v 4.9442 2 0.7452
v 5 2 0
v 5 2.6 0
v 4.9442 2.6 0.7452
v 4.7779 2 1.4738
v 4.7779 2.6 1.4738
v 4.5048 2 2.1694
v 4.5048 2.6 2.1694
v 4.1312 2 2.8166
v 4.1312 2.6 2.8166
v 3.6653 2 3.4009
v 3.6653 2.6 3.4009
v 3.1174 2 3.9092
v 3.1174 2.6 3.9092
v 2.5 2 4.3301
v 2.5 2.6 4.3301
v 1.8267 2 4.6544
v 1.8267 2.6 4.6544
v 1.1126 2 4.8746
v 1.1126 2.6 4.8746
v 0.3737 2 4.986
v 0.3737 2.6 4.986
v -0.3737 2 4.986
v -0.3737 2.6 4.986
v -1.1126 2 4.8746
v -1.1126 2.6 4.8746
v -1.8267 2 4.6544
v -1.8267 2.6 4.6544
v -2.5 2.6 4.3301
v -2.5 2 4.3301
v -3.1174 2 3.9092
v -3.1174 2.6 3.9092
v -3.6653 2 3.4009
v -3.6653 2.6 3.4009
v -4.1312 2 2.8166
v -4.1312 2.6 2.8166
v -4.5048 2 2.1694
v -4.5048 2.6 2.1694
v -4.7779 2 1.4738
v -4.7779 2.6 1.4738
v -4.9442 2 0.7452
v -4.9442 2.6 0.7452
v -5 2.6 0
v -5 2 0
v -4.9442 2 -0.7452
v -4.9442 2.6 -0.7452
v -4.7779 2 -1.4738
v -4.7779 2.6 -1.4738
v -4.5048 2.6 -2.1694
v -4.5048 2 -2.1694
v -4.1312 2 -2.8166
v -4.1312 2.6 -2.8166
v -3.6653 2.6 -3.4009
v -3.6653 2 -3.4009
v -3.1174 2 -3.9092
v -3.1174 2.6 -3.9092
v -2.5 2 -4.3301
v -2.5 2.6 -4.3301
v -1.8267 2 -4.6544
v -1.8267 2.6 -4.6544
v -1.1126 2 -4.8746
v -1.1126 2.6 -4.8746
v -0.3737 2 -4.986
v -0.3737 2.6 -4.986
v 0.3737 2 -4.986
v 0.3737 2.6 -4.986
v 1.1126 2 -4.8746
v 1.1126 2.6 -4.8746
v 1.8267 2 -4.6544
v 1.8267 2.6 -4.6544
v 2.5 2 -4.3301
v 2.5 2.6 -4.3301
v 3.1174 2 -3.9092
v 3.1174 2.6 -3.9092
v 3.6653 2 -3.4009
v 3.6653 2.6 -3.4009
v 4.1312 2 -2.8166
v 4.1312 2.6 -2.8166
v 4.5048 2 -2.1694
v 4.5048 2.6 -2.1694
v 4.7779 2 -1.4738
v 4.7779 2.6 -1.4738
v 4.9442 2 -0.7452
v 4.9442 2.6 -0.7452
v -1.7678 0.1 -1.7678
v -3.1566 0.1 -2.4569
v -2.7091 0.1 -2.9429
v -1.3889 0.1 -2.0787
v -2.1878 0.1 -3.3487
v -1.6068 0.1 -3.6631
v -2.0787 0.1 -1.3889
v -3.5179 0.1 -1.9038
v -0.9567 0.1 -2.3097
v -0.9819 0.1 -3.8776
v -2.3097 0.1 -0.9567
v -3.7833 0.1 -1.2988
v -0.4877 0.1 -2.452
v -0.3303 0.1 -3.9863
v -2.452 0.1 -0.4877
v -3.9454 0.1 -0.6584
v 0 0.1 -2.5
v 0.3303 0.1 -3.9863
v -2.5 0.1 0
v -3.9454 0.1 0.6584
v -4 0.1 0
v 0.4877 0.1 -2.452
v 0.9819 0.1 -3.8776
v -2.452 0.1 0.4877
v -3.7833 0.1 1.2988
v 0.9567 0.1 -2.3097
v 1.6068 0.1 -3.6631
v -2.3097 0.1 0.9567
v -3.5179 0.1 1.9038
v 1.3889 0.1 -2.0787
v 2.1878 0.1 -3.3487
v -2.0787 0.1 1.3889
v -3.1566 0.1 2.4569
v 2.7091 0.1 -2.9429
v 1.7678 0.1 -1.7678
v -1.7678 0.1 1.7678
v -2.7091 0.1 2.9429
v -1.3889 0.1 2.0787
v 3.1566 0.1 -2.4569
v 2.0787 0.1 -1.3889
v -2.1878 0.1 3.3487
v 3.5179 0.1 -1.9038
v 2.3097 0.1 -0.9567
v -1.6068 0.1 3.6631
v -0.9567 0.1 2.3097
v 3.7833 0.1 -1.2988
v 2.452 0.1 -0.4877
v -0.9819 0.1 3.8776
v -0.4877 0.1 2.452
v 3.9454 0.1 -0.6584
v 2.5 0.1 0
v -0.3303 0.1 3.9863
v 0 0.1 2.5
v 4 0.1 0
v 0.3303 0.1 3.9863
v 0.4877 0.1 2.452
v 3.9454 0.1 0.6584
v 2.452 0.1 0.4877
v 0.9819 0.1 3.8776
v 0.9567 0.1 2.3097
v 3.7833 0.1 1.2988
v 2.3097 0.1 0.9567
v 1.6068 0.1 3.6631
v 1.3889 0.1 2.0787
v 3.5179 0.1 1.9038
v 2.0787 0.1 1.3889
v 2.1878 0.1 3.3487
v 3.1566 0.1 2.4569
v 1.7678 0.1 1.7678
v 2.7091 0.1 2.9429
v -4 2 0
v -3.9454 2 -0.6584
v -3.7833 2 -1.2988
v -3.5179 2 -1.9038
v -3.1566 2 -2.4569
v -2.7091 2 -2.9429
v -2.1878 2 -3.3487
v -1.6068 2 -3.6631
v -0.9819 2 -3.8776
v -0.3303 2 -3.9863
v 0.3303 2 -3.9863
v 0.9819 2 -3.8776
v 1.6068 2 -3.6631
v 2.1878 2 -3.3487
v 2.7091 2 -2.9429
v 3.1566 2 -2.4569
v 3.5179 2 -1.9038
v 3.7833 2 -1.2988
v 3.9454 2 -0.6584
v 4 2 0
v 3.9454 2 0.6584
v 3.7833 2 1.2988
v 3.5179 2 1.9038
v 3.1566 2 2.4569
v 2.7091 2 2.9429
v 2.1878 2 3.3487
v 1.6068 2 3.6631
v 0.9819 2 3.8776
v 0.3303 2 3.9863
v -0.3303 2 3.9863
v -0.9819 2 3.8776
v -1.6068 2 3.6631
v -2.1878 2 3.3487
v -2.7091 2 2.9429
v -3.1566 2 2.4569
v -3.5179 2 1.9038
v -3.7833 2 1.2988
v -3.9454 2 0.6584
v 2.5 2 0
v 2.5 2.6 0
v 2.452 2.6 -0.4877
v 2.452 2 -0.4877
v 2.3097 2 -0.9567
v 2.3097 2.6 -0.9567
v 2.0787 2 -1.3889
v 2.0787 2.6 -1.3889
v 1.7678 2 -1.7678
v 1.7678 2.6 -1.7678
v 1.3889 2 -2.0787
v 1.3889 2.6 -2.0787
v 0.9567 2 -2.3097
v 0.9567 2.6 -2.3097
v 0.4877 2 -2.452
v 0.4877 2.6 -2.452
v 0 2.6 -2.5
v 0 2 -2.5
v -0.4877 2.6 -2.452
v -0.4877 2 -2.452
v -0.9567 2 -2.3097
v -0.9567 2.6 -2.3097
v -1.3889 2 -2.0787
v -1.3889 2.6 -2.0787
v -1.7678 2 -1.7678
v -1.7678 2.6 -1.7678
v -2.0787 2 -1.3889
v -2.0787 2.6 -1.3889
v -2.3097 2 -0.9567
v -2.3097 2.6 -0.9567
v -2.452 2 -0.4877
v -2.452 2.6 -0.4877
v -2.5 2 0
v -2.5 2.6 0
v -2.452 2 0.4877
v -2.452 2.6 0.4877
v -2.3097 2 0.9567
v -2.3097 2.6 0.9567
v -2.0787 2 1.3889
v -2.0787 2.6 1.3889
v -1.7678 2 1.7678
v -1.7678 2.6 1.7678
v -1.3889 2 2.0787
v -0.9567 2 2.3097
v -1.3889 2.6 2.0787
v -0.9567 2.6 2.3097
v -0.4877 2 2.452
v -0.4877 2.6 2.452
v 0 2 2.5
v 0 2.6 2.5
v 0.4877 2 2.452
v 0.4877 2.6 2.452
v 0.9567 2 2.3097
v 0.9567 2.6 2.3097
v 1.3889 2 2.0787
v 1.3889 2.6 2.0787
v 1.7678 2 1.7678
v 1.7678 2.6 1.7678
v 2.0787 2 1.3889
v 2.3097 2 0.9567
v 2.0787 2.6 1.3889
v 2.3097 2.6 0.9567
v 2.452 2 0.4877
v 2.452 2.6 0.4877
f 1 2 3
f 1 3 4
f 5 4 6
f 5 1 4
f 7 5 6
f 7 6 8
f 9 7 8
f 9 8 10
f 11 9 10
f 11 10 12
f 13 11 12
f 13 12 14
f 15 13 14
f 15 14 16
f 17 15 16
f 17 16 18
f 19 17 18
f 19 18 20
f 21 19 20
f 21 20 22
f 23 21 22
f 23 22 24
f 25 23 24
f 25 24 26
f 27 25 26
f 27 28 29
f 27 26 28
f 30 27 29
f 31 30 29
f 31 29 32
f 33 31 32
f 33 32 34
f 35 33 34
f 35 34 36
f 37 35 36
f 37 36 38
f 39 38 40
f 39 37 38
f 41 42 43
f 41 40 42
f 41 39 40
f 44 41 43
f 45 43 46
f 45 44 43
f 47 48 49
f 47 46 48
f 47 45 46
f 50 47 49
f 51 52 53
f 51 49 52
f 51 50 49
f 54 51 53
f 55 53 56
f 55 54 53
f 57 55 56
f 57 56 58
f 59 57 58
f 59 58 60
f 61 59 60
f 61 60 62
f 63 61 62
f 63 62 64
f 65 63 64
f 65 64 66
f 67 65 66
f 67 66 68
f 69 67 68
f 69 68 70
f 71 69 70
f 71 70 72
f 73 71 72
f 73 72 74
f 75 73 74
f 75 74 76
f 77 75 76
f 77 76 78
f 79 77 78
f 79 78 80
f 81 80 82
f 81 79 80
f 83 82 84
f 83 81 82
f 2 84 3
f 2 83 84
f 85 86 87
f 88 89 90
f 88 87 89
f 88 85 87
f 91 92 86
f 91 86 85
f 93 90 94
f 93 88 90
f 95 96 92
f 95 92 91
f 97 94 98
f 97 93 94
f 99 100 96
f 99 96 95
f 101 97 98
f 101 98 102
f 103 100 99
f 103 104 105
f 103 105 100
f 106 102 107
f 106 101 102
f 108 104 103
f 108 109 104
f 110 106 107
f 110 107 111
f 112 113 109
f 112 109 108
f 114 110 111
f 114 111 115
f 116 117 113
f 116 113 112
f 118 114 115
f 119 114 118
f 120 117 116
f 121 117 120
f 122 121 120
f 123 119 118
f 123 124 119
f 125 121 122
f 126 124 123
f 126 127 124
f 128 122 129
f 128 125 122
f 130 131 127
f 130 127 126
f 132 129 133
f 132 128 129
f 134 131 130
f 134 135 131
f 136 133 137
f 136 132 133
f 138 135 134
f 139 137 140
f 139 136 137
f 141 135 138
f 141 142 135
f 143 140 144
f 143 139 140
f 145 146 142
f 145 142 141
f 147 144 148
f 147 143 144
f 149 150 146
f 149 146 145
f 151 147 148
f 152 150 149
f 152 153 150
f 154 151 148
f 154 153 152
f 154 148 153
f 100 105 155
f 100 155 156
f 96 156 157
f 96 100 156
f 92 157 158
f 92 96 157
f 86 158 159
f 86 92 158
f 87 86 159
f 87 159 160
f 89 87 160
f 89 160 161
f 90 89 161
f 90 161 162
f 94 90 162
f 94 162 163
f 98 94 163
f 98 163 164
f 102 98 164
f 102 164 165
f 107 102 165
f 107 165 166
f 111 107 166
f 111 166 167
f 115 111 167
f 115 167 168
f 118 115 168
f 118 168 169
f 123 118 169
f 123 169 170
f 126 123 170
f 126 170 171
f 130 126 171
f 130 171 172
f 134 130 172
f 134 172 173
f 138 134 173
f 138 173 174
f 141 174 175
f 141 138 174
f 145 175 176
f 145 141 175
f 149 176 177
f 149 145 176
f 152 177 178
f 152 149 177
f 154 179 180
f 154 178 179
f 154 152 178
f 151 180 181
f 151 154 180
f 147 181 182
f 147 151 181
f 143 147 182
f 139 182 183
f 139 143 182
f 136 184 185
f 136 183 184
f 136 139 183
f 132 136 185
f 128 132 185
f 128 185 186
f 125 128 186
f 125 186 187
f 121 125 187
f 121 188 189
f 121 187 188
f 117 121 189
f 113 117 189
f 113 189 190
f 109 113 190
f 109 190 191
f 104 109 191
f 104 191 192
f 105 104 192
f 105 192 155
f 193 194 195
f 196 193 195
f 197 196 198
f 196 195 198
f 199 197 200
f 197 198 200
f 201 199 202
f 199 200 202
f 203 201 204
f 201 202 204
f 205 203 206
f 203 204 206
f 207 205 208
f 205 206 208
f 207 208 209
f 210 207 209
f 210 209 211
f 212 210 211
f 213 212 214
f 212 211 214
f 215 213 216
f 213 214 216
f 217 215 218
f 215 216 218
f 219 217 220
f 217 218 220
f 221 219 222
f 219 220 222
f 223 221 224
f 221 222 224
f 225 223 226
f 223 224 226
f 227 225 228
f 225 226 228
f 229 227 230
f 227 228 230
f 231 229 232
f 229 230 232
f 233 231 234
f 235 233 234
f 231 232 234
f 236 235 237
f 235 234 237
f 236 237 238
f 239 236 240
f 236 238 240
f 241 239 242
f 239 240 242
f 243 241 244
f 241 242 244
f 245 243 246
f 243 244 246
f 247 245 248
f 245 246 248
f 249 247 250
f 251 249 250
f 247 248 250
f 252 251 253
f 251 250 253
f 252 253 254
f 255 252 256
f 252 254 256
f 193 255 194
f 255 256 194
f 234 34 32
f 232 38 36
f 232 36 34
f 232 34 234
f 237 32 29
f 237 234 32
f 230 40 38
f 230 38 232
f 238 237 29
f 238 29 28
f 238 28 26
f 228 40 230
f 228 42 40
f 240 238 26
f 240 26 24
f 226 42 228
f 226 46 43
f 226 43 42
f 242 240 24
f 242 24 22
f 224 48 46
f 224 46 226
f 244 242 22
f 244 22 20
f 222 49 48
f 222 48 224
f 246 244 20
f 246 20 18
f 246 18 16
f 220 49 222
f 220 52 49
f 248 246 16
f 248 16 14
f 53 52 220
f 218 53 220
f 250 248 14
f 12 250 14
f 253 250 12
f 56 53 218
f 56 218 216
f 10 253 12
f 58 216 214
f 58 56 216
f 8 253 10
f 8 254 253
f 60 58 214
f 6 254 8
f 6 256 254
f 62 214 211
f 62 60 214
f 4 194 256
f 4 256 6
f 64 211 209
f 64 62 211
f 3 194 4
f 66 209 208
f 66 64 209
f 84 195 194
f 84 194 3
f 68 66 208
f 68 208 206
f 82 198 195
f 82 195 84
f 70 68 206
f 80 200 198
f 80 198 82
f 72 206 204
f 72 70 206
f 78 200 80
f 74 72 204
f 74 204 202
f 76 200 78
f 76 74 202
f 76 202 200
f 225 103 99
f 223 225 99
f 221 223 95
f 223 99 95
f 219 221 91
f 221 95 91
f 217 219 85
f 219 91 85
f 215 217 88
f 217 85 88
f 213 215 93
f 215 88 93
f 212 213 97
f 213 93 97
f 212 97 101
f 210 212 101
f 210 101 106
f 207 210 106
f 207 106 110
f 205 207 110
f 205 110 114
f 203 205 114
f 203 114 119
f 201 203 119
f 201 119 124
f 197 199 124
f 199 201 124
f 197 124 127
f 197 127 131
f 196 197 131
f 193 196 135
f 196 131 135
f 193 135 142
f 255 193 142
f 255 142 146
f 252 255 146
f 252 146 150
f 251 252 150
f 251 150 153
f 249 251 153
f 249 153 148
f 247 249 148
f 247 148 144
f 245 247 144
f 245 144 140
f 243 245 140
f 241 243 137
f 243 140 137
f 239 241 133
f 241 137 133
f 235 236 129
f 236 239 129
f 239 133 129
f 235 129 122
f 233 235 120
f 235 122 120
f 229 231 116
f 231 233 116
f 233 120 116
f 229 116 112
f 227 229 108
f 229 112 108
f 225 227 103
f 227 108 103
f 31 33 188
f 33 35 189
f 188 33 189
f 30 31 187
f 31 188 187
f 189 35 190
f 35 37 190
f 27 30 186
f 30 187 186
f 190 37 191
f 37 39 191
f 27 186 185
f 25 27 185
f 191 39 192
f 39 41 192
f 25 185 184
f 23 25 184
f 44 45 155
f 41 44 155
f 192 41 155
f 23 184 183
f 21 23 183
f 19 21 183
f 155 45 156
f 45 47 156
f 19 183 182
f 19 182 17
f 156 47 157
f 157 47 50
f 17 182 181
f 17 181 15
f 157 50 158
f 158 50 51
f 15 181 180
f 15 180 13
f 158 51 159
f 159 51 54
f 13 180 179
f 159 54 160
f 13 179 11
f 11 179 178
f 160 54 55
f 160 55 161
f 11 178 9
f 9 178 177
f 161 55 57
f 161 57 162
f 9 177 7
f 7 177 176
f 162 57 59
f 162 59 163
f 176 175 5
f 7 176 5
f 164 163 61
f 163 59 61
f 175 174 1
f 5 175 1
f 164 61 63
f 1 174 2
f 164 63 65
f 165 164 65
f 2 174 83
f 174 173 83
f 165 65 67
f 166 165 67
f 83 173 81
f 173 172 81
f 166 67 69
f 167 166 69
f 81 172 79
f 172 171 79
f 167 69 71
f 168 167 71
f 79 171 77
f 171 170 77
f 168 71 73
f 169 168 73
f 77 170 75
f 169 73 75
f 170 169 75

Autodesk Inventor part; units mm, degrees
ref_plane "YZ Plane" through (0, 0, 0) normal (1, 0, 0) x (0, 1, 0)
ref_plane "XZ Plane" through (0, 0, 0) normal (0, 1, 0) x (-1, 0, 0)
ref_plane "XY Plane" through (0, 0, 0) normal (0, 0, 1) x (1, 0, 0)
sketch "スケッチ1" plane through (0, 0, 0) normal (0, 1, 0) x (-1, 0, 0)
  circle A0 centre (0, 0) radius 4
  circle A1 centre (0, 0) radius 2.5
  dimension "d0" = 8
  dimension "d1" = 5
extrude "押し出し1" add sketch "スケッチ1" along normal blind 2
sketch "スケッチ2" plane through (0, 2, 0) normal (0, 1, 0) x (1, 0, 0)
  circle A0 centre (0, 0) radius 5
  dimension "d4" = 10
extrude "押し出し2" add sketch "スケッチ2" along normal blind 1
sketch "スケッチ3" plane through (0, 3, 0) normal (0, 1, 0) x (1, 0, 0)
  circle A0 centre (0, 0) radius 5
extrude "押し出し3" cut sketch "スケッチ3" against normal blind 0.4
sketch "スケッチ4" plane through (0, 2.6, 0) normal (0, 1, 0) x (1, 0, 0)
  circle A0 centre (0, 0) radius 2.5 projected
  circle A1 centre (0, 0) radius 2.5
  dimension "d9" = 5
extrude "押し出し4" cut sketch "スケッチ4" against normal blind 0.6
sketch "スケッチ5" plane through (0, 0, 0) normal (0, -1, 0) x (1, 0, 0)
  circle A0 centre (0, 0) radius 2.5
  circle A1 centre (0, 0) radius 4
extrude "押し出し5" cut sketch "スケッチ5" against normal blind 0.1
properties part number "SMF85 ベアリング" material "ステンレス鋼"
